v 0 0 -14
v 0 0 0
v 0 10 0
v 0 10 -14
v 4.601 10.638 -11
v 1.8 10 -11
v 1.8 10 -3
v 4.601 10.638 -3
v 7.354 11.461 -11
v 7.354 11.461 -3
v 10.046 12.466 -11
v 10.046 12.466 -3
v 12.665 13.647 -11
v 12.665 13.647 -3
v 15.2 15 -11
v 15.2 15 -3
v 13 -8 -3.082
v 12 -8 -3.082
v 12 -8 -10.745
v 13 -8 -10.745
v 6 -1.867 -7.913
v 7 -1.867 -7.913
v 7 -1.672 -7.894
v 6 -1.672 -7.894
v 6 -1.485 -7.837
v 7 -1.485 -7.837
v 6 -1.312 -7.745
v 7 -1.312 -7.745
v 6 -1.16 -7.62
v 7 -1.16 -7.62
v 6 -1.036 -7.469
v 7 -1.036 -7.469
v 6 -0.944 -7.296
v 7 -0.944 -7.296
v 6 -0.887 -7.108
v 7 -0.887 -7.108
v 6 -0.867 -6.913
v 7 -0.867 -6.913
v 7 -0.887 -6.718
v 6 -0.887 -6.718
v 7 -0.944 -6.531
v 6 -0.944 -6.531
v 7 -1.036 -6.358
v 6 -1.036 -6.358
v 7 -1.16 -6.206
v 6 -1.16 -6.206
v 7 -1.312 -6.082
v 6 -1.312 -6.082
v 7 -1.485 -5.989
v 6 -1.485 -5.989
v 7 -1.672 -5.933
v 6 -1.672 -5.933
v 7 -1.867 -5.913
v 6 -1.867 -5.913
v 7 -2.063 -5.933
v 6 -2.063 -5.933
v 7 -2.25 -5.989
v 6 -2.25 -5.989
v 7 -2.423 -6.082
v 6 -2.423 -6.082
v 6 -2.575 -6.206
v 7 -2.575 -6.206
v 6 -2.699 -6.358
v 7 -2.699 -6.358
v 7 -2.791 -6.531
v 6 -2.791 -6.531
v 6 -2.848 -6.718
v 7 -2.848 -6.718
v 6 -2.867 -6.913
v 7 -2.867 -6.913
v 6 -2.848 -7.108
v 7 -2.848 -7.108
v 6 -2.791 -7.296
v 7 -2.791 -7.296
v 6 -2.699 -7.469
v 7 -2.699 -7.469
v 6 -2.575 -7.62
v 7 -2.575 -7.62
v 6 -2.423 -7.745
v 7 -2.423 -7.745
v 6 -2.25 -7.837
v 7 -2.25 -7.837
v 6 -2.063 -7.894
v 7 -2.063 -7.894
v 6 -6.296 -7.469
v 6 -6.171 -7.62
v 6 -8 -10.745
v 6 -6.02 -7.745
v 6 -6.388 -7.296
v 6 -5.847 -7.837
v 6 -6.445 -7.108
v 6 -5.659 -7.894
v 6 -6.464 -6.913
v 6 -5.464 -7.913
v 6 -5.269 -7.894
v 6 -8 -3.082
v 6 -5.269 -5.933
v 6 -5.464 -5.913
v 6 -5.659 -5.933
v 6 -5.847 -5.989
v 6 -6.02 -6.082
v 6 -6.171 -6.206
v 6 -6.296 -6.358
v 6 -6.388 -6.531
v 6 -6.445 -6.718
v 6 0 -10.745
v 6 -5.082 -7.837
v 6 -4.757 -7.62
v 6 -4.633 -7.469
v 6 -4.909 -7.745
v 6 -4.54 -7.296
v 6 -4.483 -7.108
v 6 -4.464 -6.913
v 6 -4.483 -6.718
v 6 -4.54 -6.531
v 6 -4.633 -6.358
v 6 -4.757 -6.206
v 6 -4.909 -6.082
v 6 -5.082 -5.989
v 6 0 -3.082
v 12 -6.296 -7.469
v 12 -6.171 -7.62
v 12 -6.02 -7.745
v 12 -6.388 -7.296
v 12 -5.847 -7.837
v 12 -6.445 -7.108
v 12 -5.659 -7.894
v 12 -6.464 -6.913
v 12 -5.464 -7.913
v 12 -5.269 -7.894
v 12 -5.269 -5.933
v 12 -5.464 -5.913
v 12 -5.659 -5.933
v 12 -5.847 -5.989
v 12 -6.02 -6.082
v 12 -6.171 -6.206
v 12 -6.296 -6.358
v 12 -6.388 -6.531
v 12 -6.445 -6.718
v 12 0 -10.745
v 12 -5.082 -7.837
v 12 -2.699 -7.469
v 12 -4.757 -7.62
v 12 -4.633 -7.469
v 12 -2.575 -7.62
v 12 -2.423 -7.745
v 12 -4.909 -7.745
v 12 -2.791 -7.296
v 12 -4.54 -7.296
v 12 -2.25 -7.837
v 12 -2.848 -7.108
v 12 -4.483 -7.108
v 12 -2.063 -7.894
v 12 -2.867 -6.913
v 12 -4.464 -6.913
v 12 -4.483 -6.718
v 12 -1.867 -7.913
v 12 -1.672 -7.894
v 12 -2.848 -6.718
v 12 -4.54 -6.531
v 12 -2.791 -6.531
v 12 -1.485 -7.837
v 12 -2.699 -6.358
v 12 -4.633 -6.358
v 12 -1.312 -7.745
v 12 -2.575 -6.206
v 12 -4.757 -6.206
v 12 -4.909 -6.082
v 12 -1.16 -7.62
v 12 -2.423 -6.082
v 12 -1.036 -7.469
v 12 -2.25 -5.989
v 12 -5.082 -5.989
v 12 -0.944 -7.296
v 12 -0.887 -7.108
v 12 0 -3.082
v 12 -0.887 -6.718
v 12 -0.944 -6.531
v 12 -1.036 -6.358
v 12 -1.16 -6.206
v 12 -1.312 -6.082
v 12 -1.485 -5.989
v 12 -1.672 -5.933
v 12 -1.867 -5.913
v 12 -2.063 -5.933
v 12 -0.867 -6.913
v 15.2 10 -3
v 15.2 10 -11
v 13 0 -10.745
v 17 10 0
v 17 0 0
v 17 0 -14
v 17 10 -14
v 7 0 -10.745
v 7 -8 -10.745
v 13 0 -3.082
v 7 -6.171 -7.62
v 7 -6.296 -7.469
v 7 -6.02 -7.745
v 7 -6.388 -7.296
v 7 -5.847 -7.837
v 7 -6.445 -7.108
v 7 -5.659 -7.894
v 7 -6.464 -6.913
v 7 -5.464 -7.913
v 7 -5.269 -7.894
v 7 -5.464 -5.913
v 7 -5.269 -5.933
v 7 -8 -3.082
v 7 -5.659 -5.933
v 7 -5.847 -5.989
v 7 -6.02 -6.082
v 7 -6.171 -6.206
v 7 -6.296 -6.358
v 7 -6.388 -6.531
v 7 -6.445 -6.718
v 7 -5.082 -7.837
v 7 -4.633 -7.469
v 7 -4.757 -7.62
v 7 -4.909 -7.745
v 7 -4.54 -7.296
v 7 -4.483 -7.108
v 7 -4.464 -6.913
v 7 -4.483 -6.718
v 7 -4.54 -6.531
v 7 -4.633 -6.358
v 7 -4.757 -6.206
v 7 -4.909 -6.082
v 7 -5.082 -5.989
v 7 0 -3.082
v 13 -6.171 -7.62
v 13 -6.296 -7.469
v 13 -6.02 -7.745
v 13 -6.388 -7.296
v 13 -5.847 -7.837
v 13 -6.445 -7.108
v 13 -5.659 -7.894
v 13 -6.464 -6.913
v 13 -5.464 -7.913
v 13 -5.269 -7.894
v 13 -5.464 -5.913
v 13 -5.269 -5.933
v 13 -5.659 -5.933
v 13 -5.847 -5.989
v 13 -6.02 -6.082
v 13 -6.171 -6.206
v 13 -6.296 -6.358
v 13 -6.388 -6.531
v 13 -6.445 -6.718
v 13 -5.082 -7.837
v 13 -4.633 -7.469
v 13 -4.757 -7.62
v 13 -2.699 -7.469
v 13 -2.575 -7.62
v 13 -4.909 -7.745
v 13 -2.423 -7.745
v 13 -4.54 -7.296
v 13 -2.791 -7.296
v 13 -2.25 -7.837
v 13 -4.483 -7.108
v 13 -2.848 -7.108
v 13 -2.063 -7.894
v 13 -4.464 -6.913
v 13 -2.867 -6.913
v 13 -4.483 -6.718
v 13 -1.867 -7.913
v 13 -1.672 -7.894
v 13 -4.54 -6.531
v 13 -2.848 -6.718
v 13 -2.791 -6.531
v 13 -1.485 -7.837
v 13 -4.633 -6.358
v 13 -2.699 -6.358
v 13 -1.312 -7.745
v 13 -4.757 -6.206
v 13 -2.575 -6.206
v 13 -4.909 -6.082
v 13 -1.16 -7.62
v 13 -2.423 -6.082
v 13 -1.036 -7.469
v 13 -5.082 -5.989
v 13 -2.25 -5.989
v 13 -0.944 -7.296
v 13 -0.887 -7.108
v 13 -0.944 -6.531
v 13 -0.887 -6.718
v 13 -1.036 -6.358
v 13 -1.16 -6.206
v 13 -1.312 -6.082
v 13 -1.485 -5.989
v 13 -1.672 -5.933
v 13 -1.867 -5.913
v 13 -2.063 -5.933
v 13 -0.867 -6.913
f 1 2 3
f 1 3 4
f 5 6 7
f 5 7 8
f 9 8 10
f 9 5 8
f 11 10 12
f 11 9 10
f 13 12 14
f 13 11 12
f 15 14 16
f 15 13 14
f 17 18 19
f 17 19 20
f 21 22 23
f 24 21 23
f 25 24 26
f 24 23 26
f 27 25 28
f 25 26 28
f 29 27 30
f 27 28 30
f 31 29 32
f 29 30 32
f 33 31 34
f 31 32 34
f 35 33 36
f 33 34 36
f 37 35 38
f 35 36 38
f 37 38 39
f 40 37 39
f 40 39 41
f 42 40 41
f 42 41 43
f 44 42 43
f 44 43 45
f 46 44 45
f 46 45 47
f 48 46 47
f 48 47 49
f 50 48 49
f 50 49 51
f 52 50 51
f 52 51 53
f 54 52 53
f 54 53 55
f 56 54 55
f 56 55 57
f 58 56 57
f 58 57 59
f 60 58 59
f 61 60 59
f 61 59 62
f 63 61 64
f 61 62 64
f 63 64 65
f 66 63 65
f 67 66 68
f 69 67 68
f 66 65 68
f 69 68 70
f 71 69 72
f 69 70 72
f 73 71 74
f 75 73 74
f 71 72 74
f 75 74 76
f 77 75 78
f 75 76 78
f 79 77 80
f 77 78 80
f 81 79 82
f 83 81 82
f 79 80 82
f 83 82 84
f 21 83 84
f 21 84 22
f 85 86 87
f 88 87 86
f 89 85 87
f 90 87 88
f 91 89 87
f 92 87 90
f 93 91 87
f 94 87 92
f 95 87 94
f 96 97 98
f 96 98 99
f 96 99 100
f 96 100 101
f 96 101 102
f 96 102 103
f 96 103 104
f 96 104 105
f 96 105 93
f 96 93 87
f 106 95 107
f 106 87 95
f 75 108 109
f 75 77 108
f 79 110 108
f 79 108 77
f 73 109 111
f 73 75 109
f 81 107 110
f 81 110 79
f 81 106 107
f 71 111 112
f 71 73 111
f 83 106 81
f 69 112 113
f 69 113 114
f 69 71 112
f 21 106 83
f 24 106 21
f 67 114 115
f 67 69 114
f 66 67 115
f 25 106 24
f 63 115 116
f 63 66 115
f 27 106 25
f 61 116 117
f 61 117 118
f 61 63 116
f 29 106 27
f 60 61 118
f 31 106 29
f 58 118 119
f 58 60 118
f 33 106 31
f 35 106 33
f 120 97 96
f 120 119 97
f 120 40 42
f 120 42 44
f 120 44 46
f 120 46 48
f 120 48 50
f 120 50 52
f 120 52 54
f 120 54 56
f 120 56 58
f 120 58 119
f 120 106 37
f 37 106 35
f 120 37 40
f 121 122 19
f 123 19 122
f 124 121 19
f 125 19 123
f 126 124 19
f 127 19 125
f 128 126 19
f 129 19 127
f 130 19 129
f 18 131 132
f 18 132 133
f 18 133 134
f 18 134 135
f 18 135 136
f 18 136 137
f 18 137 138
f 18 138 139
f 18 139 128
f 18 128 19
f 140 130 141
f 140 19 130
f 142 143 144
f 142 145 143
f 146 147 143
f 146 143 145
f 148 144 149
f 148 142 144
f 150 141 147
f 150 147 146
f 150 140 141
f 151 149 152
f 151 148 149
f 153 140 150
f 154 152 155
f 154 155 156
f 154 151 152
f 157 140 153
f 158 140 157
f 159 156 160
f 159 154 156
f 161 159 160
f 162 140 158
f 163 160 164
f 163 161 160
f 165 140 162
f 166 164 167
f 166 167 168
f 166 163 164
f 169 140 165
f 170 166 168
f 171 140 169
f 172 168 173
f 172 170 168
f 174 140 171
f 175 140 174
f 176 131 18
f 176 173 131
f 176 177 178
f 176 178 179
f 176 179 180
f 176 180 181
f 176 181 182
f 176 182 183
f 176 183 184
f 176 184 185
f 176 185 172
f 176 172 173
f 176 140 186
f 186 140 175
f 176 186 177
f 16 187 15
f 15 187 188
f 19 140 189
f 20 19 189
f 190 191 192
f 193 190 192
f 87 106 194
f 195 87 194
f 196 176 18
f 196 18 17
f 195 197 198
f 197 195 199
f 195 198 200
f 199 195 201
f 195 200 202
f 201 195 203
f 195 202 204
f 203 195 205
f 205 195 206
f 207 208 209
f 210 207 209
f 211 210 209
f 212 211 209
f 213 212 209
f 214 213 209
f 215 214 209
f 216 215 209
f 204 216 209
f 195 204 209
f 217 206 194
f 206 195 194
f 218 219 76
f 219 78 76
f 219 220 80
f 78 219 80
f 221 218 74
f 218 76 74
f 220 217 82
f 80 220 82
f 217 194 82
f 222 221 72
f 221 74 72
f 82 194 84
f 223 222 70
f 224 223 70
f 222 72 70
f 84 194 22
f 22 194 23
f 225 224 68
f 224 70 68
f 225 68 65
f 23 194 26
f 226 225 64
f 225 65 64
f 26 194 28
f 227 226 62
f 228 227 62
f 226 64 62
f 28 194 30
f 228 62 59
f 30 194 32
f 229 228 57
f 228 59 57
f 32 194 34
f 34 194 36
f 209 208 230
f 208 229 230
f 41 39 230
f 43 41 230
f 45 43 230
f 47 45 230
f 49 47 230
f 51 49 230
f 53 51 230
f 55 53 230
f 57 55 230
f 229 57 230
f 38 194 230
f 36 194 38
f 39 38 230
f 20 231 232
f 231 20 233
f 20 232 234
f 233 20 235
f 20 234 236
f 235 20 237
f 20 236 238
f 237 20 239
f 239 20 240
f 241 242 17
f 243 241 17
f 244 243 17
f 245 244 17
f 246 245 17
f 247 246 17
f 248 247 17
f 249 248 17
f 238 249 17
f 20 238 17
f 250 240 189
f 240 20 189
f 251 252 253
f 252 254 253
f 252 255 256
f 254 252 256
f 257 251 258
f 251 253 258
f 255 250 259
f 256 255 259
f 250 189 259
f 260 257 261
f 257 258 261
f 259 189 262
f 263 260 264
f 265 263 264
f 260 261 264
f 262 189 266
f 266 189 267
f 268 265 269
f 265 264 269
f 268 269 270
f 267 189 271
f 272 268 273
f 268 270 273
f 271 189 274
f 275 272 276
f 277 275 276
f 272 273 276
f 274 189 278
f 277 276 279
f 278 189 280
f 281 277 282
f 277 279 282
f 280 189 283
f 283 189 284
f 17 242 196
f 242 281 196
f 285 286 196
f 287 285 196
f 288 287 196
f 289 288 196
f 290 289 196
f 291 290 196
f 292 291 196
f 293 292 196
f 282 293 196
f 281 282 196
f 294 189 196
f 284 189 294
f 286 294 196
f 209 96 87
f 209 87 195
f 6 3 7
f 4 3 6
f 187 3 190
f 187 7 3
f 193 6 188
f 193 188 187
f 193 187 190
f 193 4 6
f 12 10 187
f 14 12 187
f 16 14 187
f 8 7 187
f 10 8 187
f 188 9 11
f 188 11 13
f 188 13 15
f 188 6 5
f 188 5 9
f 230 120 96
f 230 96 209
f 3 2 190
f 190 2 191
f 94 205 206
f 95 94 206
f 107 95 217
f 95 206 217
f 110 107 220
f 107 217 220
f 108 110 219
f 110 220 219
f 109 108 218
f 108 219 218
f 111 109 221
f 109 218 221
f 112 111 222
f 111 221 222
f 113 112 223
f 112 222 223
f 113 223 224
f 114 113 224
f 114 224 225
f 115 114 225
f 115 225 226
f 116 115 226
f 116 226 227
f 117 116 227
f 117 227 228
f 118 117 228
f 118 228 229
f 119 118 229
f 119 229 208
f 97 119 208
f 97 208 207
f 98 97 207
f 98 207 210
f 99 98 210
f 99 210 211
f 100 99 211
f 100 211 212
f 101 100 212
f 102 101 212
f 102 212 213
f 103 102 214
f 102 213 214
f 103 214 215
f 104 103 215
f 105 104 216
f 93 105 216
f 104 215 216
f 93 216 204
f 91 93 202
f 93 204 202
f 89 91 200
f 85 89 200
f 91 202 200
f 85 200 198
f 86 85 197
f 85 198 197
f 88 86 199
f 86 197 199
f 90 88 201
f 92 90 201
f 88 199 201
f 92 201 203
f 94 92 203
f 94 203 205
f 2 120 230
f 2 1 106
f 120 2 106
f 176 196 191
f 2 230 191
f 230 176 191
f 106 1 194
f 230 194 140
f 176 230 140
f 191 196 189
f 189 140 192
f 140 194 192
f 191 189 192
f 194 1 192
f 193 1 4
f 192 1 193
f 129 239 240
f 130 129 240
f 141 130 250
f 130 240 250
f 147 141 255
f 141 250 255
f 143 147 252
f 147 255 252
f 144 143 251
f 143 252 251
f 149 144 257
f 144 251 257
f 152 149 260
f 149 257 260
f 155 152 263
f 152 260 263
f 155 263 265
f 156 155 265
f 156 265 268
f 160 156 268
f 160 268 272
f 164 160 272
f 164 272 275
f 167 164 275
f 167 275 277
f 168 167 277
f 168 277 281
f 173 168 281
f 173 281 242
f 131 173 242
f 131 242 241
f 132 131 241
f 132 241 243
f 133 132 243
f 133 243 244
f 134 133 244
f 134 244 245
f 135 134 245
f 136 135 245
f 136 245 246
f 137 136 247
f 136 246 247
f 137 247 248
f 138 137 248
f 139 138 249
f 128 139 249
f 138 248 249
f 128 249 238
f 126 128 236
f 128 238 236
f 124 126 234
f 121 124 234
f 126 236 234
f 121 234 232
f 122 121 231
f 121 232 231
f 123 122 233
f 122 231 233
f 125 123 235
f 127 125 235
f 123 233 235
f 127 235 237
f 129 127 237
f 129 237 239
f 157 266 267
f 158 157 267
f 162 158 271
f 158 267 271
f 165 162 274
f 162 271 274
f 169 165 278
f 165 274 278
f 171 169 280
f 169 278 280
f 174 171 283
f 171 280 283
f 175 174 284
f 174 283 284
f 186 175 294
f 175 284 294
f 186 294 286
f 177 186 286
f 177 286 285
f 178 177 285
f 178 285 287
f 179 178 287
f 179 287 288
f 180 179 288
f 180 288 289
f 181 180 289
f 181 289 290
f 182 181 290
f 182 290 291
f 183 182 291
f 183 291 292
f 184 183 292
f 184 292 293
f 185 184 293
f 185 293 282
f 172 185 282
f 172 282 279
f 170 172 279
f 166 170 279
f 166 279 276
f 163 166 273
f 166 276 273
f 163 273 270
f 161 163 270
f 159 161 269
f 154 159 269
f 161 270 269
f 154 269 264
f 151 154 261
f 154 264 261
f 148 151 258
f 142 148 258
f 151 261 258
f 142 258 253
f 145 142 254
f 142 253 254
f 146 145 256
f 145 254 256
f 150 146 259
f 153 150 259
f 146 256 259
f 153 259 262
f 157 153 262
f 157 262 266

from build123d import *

# Parameters (mm, degrees)
SKETCH1_W           = 17
SKETCH1_H           = 14
BOSS_EXTRUDE1_DEPTH = 10
SKETCH2_W           = 13.4
SKETCH2_H           = 8
BOSS_EXTRUDE2_DEPTH = 5
CUT_EXTRUDE4_START  = -8
CUT_EXTRUDE4_DEPTH  = 8
SKETCH4_W           = 1
SKETCH4_H           = 7.663229465
BOSS_EXTRUDE3_DEPTH = 8
SKETCH5_R           = 1
CUT_EXTRUDE5_DEPTH  = 25.289915603


# Read off the part's stored shape, not the designer's step: Cut-Extrude4
with BuildPart() as part:
    # Sketch1 → Boss-Extrude1 (new body)
    with BuildSketch(Plane(origin=(0, 0, 0), x_dir=(1, 0, 0), z_dir=(0, 1, 0))):
        with Locations((8.5, 7)):
            Rectangle(SKETCH1_W, SKETCH1_H)
    extrude(amount=BOSS_EXTRUDE1_DEPTH)

    # Sketch2 → Boss-Extrude2 (add)
    with BuildSketch(Plane(origin=(0, 10, 0), x_dir=(1, 0, 0), z_dir=(0, 1, 0))):
        with Locations((8.5, 7)):
            Rectangle(SKETCH2_W, SKETCH2_H)
    extrude(amount=BOSS_EXTRUDE2_DEPTH)

    # Cut-Extrude4 outline → Cut-Extrude4 (cut)
    with BuildSketch(Plane.XY.offset(-3).offset(CUT_EXTRUDE4_START)):
        with BuildLine():
            Line((1.8, 15), (1.8, 10))
            ThreePointArc((1.8, 10), (8.708594461, 11.940966845), (15.2, 15))
            Line((15.2, 15), (1.8, 15))
        make_face()
    extrude(amount=CUT_EXTRUDE4_DEPTH, mode=Mode.SUBTRACT)

    # Sketch4 → Boss-Extrude3 (add)
    with BuildSketch(Plane.XZ):
        with Locations((6.5, -6.913355446)):
            Rectangle(SKETCH4_W, SKETCH4_H)
        with Locations((12.5, -6.913355446)):
            Rectangle(SKETCH4_W, SKETCH4_H)
    extrude(amount=BOSS_EXTRUDE3_DEPTH)

    # Sketch5 → Cut-Extrude5 (cut, through all)
    with BuildSketch(Plane(origin=(13, 0, 0), x_dir=(0, 0, -1), z_dir=(1, 0, 0))):
        with Locations((6.913355446, -1.867470442)):
            Circle(SKETCH5_R)
        with Locations((6.913355446, -5.464189838)):
            Circle(SKETCH5_R)
    extrude(amount=-CUT_EXTRUDE5_DEPTH, mode=Mode.SUBTRACT)


solid = part.part
